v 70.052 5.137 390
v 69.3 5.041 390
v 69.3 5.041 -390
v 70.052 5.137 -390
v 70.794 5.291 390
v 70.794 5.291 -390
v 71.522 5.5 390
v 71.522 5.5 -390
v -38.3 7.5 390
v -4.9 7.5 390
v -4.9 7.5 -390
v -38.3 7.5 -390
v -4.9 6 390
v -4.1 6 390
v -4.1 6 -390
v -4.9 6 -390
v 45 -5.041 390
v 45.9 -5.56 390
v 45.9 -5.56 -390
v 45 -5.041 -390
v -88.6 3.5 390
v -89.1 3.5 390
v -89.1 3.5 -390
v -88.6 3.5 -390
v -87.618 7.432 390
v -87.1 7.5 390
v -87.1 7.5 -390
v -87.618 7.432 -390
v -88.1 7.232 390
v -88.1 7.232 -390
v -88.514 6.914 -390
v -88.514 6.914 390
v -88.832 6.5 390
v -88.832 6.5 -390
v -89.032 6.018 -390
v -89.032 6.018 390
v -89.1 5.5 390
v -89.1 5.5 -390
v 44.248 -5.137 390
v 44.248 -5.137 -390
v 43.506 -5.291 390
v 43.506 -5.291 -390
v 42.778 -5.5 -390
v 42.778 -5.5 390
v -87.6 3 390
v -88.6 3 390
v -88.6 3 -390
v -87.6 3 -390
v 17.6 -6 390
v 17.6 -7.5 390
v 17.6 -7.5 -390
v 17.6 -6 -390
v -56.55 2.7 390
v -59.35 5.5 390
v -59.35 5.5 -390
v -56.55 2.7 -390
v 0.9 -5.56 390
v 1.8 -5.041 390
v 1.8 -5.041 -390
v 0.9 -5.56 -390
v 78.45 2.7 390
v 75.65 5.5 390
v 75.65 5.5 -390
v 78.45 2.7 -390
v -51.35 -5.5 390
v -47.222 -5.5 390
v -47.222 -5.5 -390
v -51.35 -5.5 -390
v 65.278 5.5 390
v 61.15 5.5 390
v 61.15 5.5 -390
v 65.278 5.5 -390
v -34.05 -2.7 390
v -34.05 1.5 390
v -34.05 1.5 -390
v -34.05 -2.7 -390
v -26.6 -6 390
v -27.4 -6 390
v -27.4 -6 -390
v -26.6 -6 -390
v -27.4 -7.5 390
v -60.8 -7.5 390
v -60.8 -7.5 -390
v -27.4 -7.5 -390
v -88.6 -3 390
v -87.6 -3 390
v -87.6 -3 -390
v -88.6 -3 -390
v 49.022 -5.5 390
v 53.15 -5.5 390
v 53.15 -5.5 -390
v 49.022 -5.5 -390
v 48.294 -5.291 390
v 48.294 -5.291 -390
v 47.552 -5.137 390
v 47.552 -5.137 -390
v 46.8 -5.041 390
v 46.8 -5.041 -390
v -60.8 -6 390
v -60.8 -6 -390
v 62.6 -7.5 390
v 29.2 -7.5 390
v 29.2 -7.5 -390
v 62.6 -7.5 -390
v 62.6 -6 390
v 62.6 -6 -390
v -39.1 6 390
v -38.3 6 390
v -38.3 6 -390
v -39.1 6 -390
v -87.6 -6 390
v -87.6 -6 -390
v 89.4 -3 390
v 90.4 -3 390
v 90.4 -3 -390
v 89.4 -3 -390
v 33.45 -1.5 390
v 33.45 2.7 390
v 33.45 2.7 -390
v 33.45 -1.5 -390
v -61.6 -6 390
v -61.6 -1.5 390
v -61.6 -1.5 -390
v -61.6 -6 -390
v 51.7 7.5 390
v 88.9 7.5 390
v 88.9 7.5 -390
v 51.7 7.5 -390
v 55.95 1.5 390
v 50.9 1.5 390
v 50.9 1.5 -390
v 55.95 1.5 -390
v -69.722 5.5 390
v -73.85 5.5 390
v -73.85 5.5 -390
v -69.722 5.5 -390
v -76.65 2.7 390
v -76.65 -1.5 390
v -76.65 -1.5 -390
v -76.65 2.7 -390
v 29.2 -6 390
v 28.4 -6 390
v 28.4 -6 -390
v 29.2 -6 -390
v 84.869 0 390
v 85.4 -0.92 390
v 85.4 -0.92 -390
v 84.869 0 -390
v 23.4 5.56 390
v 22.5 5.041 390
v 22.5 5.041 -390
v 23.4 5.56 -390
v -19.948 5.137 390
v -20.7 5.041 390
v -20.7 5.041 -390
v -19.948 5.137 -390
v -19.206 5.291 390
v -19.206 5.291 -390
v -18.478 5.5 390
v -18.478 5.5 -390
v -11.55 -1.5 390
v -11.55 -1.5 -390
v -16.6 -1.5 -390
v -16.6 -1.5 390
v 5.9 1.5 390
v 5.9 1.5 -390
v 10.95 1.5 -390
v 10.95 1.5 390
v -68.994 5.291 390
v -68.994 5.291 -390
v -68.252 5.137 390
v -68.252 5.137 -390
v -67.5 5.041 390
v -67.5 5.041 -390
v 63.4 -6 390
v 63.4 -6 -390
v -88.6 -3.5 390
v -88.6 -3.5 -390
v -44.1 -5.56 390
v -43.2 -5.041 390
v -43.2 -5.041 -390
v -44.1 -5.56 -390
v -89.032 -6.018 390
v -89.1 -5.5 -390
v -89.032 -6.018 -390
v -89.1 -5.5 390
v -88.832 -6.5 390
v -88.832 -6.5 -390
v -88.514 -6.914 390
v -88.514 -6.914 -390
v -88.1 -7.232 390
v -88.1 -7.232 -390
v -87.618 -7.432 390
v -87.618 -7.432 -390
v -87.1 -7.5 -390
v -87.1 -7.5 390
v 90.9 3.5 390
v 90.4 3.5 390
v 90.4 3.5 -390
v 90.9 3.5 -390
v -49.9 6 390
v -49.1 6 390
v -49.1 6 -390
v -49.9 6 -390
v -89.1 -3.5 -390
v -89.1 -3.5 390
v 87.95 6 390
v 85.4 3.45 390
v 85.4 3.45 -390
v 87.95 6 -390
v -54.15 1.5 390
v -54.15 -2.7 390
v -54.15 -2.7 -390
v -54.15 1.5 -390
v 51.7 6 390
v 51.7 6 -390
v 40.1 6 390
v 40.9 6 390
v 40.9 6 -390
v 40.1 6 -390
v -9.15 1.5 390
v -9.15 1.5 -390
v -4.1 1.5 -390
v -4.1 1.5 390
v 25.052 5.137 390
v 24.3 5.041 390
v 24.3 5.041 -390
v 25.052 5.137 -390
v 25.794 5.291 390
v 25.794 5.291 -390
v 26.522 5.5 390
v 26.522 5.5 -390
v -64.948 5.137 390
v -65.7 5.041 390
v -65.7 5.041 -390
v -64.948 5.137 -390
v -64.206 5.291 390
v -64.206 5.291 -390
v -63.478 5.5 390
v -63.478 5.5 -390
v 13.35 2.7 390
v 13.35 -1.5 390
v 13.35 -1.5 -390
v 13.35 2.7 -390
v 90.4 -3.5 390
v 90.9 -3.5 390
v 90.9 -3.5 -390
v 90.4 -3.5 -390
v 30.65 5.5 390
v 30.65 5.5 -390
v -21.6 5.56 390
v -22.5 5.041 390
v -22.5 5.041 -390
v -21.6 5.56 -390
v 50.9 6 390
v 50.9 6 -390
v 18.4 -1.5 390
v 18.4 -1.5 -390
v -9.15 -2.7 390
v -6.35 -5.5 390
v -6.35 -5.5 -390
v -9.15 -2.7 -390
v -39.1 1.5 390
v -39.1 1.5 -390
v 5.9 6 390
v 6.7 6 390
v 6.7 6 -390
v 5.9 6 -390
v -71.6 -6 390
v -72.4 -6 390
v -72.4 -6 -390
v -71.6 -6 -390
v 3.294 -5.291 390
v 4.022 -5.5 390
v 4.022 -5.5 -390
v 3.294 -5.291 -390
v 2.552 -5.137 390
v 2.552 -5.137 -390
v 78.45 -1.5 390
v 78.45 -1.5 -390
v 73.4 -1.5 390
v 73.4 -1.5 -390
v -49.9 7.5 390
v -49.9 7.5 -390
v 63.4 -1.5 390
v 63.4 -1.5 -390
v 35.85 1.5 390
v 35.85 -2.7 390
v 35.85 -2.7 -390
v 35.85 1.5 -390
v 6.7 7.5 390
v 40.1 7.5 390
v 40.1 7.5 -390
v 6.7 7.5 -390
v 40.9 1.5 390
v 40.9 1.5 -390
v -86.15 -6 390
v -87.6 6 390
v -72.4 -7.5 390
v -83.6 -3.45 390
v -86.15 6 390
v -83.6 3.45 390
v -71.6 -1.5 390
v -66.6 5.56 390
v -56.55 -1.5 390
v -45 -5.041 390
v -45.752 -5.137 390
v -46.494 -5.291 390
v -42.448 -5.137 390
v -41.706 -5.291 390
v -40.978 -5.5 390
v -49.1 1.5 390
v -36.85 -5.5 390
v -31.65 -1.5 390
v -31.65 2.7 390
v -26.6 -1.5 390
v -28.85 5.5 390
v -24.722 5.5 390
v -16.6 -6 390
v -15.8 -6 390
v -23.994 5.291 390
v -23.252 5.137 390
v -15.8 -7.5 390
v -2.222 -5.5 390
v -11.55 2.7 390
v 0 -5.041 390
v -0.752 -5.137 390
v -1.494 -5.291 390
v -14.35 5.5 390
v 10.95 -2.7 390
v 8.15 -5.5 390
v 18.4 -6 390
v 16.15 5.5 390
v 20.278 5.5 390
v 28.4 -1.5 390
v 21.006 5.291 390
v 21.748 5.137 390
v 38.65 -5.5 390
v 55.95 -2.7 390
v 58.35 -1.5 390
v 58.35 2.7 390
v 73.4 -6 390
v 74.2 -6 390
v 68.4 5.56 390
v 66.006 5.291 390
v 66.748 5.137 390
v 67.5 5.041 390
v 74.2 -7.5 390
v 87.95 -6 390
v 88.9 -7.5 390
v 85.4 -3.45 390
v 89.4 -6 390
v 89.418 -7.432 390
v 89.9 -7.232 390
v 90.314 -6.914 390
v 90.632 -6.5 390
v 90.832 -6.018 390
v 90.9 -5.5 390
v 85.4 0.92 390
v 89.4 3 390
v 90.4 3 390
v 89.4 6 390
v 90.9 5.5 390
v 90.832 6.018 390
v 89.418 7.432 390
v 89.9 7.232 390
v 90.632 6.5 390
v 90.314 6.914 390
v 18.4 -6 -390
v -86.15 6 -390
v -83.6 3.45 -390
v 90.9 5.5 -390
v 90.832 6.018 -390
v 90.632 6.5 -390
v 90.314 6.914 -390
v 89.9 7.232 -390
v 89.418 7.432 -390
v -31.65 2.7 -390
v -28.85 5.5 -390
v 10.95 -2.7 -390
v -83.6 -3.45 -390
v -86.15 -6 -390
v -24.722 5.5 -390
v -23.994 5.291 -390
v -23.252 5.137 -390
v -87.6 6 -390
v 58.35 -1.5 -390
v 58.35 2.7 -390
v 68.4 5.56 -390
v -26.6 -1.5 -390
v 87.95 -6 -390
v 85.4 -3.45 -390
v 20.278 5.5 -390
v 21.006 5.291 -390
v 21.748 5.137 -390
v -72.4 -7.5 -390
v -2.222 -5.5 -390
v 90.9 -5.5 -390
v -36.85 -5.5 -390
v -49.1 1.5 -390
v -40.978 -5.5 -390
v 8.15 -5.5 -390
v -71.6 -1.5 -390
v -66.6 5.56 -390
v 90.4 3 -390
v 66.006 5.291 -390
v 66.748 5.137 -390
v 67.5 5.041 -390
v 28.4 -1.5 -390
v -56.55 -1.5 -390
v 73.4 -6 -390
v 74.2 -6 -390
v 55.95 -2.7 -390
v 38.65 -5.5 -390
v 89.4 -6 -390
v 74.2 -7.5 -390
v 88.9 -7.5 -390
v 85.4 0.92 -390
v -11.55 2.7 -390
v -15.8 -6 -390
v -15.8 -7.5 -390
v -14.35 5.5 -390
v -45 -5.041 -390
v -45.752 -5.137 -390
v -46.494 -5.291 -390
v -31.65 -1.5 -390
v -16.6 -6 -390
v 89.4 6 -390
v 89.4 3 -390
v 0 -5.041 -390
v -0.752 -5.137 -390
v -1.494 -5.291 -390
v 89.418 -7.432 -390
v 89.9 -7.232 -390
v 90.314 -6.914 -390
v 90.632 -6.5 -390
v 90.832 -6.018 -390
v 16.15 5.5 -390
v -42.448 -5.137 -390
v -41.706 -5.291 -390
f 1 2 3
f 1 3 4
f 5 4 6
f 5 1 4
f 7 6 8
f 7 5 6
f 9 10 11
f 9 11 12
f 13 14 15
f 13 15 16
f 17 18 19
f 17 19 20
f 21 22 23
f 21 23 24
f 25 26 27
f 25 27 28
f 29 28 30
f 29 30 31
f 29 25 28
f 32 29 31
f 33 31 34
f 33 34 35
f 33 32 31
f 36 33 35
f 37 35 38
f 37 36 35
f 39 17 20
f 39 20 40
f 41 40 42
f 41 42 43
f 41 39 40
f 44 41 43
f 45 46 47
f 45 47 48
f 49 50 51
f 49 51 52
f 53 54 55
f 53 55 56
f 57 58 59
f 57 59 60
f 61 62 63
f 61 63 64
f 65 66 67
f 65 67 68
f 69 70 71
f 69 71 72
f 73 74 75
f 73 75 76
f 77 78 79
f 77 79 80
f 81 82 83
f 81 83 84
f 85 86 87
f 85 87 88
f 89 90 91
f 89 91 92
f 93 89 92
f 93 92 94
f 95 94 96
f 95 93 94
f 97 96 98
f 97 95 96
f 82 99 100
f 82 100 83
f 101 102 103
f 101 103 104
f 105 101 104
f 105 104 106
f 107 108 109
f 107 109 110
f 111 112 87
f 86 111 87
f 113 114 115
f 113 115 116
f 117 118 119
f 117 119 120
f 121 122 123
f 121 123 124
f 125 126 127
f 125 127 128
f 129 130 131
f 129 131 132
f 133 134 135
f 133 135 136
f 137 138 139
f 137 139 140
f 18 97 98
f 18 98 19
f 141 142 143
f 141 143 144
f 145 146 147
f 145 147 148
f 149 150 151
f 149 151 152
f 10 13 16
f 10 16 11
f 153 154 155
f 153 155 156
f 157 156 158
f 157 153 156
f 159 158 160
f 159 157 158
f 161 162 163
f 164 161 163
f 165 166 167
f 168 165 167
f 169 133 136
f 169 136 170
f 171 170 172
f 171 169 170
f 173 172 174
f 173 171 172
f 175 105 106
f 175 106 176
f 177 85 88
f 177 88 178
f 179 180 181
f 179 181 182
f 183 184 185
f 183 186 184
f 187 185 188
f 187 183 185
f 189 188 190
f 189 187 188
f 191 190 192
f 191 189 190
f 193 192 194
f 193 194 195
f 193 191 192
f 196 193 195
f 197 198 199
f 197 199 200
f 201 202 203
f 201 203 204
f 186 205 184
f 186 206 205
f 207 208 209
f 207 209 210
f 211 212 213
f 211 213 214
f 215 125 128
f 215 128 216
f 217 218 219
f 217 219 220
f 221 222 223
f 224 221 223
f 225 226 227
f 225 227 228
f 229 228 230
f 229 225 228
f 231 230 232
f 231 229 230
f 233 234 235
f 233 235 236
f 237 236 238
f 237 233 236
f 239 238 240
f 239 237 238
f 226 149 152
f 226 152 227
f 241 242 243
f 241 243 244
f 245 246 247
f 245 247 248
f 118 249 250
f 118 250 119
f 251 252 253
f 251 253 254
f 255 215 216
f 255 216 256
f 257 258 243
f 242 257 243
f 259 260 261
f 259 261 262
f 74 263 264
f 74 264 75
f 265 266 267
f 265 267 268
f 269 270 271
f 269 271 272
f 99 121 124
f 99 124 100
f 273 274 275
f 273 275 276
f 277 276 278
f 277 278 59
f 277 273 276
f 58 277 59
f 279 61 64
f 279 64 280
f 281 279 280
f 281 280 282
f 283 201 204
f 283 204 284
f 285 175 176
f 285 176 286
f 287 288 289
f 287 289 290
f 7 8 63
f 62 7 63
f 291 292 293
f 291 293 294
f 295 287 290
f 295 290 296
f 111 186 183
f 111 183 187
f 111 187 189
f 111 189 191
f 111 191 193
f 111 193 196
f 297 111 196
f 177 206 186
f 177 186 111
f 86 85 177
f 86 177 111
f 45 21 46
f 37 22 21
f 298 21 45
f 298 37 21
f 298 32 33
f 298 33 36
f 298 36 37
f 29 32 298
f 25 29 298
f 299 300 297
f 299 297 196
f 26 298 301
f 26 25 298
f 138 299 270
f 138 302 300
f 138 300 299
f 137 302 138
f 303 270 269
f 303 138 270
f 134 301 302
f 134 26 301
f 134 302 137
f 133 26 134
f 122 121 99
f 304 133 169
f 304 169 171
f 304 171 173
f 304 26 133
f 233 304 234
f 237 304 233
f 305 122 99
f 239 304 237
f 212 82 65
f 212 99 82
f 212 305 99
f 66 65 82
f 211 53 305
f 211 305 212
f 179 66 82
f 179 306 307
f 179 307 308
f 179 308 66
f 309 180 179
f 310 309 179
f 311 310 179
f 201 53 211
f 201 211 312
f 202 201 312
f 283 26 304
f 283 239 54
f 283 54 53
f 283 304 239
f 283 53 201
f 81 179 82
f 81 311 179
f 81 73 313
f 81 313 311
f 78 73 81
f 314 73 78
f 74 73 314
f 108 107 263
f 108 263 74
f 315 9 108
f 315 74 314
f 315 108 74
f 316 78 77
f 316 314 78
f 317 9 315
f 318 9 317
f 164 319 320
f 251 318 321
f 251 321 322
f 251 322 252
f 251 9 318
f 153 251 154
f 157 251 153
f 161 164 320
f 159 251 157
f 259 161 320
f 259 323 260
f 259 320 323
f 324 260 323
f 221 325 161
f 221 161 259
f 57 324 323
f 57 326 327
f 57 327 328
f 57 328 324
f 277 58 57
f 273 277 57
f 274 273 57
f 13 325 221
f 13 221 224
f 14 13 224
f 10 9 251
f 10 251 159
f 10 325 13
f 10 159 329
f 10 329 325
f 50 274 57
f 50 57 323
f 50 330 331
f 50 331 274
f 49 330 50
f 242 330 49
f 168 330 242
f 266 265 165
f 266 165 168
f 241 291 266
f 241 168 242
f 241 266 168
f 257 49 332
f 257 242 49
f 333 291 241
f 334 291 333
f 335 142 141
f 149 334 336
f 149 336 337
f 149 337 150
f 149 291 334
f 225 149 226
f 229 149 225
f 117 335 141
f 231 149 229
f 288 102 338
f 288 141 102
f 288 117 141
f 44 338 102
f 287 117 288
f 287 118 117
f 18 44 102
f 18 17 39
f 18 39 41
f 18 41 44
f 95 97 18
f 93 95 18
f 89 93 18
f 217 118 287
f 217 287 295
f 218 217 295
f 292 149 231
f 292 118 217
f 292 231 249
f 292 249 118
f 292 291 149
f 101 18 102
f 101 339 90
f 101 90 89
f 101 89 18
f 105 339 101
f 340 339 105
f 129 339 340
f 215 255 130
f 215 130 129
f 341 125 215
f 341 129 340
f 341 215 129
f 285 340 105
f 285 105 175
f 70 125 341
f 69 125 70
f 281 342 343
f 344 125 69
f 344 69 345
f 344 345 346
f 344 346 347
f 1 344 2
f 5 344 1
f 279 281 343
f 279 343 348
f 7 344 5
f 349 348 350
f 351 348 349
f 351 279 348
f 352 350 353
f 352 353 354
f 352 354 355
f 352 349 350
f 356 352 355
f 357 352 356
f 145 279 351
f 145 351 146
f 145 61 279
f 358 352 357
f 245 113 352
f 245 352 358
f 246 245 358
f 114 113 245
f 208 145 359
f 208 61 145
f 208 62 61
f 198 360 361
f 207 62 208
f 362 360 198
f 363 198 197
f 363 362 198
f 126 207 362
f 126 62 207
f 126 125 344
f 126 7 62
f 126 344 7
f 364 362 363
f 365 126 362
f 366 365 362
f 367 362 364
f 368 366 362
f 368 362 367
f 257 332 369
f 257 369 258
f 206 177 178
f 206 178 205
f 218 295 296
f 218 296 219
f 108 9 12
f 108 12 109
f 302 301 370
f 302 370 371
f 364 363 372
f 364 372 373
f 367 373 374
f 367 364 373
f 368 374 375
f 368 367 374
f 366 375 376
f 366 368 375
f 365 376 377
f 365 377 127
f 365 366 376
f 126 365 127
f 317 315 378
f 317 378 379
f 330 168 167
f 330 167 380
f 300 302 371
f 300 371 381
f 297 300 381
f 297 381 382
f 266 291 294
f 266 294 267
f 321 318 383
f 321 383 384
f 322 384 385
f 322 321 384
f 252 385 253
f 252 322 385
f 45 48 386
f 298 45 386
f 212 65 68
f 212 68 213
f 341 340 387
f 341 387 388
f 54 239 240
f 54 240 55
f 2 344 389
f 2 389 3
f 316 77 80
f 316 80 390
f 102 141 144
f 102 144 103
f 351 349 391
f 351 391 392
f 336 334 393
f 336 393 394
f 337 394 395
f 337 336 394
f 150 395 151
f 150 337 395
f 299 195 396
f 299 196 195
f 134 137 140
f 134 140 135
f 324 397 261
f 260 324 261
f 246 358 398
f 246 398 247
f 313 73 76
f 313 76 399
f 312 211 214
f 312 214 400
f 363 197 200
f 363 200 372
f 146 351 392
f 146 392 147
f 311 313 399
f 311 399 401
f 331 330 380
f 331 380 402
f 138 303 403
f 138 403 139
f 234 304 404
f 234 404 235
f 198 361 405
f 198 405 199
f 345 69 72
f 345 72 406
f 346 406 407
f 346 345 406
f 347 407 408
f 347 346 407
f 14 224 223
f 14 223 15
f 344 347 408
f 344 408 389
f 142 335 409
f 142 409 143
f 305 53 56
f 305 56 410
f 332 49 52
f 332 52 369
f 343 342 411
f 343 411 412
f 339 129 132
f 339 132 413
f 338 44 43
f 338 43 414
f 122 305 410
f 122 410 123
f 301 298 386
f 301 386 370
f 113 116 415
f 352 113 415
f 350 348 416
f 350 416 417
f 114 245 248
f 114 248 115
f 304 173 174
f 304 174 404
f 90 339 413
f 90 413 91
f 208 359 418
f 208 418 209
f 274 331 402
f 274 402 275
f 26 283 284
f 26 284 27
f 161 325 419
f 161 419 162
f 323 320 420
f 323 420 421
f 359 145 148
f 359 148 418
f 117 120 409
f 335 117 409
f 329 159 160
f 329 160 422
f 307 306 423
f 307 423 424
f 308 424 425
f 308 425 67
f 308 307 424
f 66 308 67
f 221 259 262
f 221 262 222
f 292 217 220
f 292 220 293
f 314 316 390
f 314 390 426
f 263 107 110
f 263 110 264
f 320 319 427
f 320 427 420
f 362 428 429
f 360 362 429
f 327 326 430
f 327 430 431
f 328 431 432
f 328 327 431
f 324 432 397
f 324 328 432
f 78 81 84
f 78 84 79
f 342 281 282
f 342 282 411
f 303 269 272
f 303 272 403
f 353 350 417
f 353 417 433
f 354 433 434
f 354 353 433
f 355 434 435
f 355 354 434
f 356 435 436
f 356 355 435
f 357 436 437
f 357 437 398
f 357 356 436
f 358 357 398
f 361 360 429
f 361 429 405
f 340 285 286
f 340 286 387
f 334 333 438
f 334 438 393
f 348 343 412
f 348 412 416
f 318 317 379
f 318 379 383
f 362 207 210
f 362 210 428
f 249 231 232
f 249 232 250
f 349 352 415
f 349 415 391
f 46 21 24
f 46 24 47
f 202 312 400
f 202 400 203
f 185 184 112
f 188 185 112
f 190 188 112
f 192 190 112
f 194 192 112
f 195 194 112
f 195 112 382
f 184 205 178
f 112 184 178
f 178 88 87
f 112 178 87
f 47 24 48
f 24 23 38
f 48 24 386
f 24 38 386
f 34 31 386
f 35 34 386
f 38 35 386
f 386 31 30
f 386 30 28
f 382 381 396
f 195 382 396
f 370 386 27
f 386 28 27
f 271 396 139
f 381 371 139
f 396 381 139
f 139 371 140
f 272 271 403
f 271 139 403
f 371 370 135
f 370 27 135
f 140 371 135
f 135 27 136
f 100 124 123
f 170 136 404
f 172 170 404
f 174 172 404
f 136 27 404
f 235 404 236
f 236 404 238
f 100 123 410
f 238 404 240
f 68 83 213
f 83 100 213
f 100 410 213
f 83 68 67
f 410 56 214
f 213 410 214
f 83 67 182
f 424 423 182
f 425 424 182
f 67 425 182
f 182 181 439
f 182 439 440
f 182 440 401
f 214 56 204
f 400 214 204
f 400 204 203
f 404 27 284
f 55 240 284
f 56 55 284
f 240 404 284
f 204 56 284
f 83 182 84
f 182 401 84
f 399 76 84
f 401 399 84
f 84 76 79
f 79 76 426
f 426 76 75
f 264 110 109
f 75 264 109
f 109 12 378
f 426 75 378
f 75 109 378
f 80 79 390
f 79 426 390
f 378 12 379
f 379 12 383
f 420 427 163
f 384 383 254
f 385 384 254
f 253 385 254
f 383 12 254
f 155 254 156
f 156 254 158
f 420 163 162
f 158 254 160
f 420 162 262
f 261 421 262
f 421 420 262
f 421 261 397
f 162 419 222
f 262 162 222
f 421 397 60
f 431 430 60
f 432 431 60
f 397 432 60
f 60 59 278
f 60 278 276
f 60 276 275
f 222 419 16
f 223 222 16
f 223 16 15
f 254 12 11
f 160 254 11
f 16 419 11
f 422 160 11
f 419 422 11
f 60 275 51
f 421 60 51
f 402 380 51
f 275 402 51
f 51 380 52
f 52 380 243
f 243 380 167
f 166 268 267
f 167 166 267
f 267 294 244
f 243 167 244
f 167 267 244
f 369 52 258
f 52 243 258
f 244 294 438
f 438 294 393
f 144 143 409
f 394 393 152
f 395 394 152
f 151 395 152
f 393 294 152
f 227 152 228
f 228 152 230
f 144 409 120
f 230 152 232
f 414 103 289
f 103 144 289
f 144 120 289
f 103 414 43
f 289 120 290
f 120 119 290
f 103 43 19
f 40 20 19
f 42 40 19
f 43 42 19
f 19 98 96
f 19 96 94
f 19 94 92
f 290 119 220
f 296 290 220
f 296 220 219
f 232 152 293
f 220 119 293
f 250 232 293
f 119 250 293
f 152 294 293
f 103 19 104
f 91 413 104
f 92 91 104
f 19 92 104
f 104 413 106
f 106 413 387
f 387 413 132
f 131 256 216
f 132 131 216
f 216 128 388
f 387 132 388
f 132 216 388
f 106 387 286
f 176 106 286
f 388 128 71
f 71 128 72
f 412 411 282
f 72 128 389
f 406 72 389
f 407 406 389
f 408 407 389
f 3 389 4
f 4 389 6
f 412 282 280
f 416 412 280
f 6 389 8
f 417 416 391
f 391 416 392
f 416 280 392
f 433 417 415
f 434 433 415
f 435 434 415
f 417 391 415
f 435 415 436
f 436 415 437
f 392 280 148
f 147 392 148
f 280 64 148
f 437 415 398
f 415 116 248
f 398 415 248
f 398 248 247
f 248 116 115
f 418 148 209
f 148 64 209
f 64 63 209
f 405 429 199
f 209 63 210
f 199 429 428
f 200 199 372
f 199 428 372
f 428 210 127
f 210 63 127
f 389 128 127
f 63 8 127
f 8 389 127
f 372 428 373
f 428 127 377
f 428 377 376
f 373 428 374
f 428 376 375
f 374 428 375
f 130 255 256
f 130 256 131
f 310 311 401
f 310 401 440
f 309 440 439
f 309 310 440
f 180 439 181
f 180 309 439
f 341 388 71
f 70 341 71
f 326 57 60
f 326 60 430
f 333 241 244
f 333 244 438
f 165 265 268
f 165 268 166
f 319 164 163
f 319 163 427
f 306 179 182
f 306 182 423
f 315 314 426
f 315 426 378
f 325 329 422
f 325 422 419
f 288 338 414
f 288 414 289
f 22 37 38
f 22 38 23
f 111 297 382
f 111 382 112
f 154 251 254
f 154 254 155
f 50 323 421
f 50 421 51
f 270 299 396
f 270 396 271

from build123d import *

# Parameters (mm, degrees)
EXTRUDE_531_DEPTH = 390


with BuildPart() as part:
    # Model → Extrude 531 (new, symmetric)
    with BuildSketch(Plane.XY):
        with BuildLine():
            Line((-87.100000001, -7.500000002), (-72.400000001, -7.500000002))
            Line((-72.400000001, -7.500000002), (-72.400000001, -6.000000002))
            Line((-72.400000001, -6.000000002), (-71.600000001, -6.000000002))
            Line((-71.600000001, -6.000000002), (-71.600000001, -1.500000002))
            Line((-71.600000001, -1.500000002), (-76.650000001, -1.500000002))
            Line((-76.650000001, -1.500000002), (-76.650000001, 2.699999998))
            Line((-76.650000001, 2.699999998), (-73.850000001, 5.499999998))
            Line((-73.850000001, 5.499999998), (-69.722499001, 5.499999998))
            ThreePointArc((-69.722499001, 5.499999998), (-68.624324752, 5.207037765), (-67.500000003, 5.040582344))
            Line((-67.500000003, 5.040582344), (-66.6, 5.560197588))
            Line((-66.6, 5.560197588), (-65.700000001, 5.040582347))
            ThreePointArc((-65.700000001, 5.040582347), (-64.575675254, 5.207037766), (-63.477501008, 5.499999998))
            Line((-63.477501008, 5.499999998), (-59.350000001, 5.499999998))
            Line((-59.350000001, 5.499999998), (-56.550000001, 2.699999998))
            Line((-56.550000001, 2.699999998), (-56.550000001, -1.500000002))
            Line((-56.550000001, -1.500000002), (-61.600000001, -1.500000002))
            Line((-61.600000001, -1.500000002), (-61.600000001, -6.000000002))
            Line((-61.600000001, -6.000000002), (-60.800000001, -6.000000002))
            Line((-60.800000001, -6.000000002), (-60.800000001, -7.500000002))
            Line((-60.800000001, -7.500000002), (-27.400000001, -7.500000002))
            Line((-27.400000001, -7.500000002), (-27.400000001, -6.000000002))
            Line((-27.400000001, -6.000000002), (-26.600000001, -6.000000002))
            Line((-26.600000001, -6.000000002), (-26.600000001, -1.500000002))
            Line((-26.600000001, -1.500000002), (-31.650000001, -1.500000002))
            Line((-31.650000001, -1.500000002), (-31.650000001, 2.699999998))
            Line((-31.650000001, 2.699999998), (-28.850000001, 5.499999998))
            Line((-28.850000001, 5.499999998), (-24.722499001, 5.499999998))
            ThreePointArc((-24.722499001, 5.499999998), (-23.624324752, 5.207037765), (-22.500000003, 5.040582344))
            Line((-22.500000003, 5.040582344), (-21.6, 5.560197588))
            Line((-21.6, 5.560197588), (-20.700000001, 5.040582347))
            ThreePointArc((-20.700000001, 5.040582347), (-19.575675254, 5.207037766), (-18.477501008, 5.499999998))
            Line((-18.477501008, 5.499999998), (-14.350000001, 5.499999998))
            Line((-14.350000001, 5.499999998), (-11.550000001, 2.699999998))
            Line((-11.550000001, 2.699999998), (-11.550000001, -1.500000002))
            Line((-11.550000001, -1.500000002), (-16.600000001, -1.500000002))
            Line((-16.600000001, -1.500000002), (-16.600000001, -6.000000002))
            Line((-16.600000001, -6.000000002), (-15.800000001, -6.000000002))
            Line((-15.800000001, -6.000000002), (-15.800000001, -7.500000002))
            Line((-15.800000001, -7.500000002), (17.599999999, -7.500000002))
            Line((17.599999999, -7.500000002), (17.599999999, -6.000000002))
            Line((17.599999999, -6.000000002), (18.399999999, -6.000000002))
            Line((18.399999999, -6.000000002), (18.399999999, -1.500000002))
            Line((18.399999999, -1.500000002), (13.349999999, -1.500000002))
            Line((13.349999999, -1.500000002), (13.349999999, 2.699999998))
            Line((13.349999999, 2.699999998), (16.149999999, 5.499999998))
            Line((16.149999999, 5.499999998), (20.277500999, 5.499999998))
            ThreePointArc((20.277500999, 5.499999998), (21.375675248, 5.207037765), (22.499999997, 5.040582344))
            Line((22.499999997, 5.040582344), (23.4, 5.560197588))
            Line((23.4, 5.560197588), (24.299999999, 5.040582347))
            ThreePointArc((24.299999999, 5.040582347), (25.424324746, 5.207037766), (26.522498992, 5.499999998))
            Line((26.522498992, 5.499999998), (30.649999999, 5.499999998))
            Line((30.649999999, 5.499999998), (33.449999999, 2.699999998))
            Line((33.449999999, 2.699999998), (33.449999999, -1.500000002))
            Line((33.449999999, -1.500000002), (28.399999999, -1.500000002))
            Line((28.399999999, -1.500000002), (28.399999999, -6.000000002))
            Line((28.399999999, -6.000000002), (29.199999999, -6.000000002))
            Line((29.199999999, -6.000000002), (29.199999999, -7.500000002))
            Line((29.199999999, -7.500000002), (62.599999999, -7.500000002))
            Line((62.599999999, -7.500000002), (62.599999999, -6.000000002))
            Line((62.599999999, -6.000000002), (63.399999999, -6.000000002))
            Line((63.399999999, -6.000000002), (63.399999999, -1.500000002))
            Line((63.399999999, -1.500000002), (58.349999999, -1.500000002))
            Line((58.349999999, -1.500000002), (58.349999999, 2.699999998))
            Line((58.349999999, 2.699999998), (61.149999999, 5.499999998))
            Line((61.149999999, 5.499999998), (65.277500999, 5.499999998))
            ThreePointArc((65.277500999, 5.499999998), (66.375675248, 5.207037765), (67.499999997, 5.040582344))
            Line((67.499999997, 5.040582344), (68.4, 5.560197588))
            Line((68.4, 5.560197588), (69.299999999, 5.040582347))
            ThreePointArc((69.299999999, 5.040582347), (70.424324746, 5.207037766), (71.522498992, 5.499999998))
            Line((71.522498992, 5.499999998), (75.649999999, 5.499999998))
            Line((75.649999999, 5.499999998), (78.449999999, 2.699999998))
            Line((78.449999999, 2.699999998), (78.449999999, -1.500000002))
            Line((78.449999999, -1.500000002), (73.399999999, -1.500000002))
            Line((73.399999999, -1.500000002), (73.399999999, -6.000000002))
            Line((73.399999999, -6.000000002), (74.199999999, -6.000000002))
            Line((74.199999999, -6.000000002), (74.199999999, -7.500000002))
            Line((74.199999999, -7.500000002), (88.899999999, -7.500000002))
            ThreePointArc((88.899999999, -7.500000002), (90.314213561, -6.914213564), (90.899999999, -5.500000002))
            Line((90.899999999, -5.500000002), (90.899999999, -3.500000002))
            Line((90.899999999, -3.500000002), (90.399999999, -3.500000002))
            Line((90.399999999, -3.500000002), (90.399999999, -3.000000002))
            Line((90.399999999, -3.000000002), (89.399999999, -3.000000002))
            Line((89.399999999, -3.000000002), (89.399999999, -6.000000002))
            Line((89.399999999, -6.000000002), (87.949999999, -6.000000002))
            Line((87.949999999, -6.000000002), (85.399999999, -3.450000002))
            Line((85.399999999, -3.450000002), (85.399999999, -0.919615242))
            Line((85.399999999, -0.919615242), (84.869059892, 0))
            Line((84.869059892, 0), (85.399999999, 0.919615242))
            Line((85.399999999, 0.919615242), (85.399999999, 3.450000002))
            Line((85.399999999, 3.450000002), (87.949999999, 6.000000002))
            Line((87.949999999, 6.000000002), (89.399999999, 6.000000002))
            Line((89.399999999, 6.000000002), (89.399999999, 3.000000002))
            Line((89.399999999, 3.000000002), (90.399999999, 3.000000002))
            Line((90.399999999, 3.000000002), (90.399999999, 3.500000002))
            Line((90.399999999, 3.500000002), (90.899999999, 3.500000002))
            Line((90.899999999, 3.500000002), (90.899999999, 5.500000002))
            ThreePointArc((90.899999999, 5.500000002), (90.314213561, 6.914213564), (88.899999999, 7.500000002))
            Line((88.899999999, 7.500000002), (51.7, 7.500000002))
            Line((51.7, 7.500000002), (51.7, 5.999999997))
            Line((51.7, 5.999999997), (50.9, 5.999999997))
            Line((50.9, 5.999999997), (50.9, 1.499999997))
            Line((50.9, 1.499999997), (55.95, 1.499999997))
            Line((55.95, 1.499999997), (55.95, -2.700000003))
            Line((55.95, -2.700000003), (53.15, -5.500000003))
            Line((53.15, -5.500000003), (49.022499, -5.500000003))
            ThreePointArc((49.022499, -5.500000003), (47.924324751, -5.20703777), (46.800000002, -5.040582349))
            Line((46.800000002, -5.040582349), (45.899999999, -5.560197593))
            Line((45.899999999, -5.560197593), (45, -5.040582352))
            ThreePointArc((45, -5.040582352), (43.875675253, -5.207037771), (42.777501007, -5.500000004))
            Line((42.777501007, -5.500000004), (38.65, -5.500000004))
            Line((38.65, -5.500000004), (35.85, -2.700000004))
            Line((35.85, -2.700000004), (35.85, 1.499999996))
            Line((35.85, 1.499999996), (40.9, 1.499999996))
            Line((40.9, 1.499999996), (40.9, 5.999999996))
            Line((40.9, 5.999999996), (40.1, 5.999999996))
            Line((40.1, 5.999999996), (40.1, 7.499999996))
            Line((40.1, 7.499999996), (6.7, 7.499999996))
            Line((6.7, 7.499999996), (6.7, 5.999999997))
            Line((6.7, 5.999999997), (5.9, 5.999999997))
            Line((5.9, 5.999999997), (5.9, 1.499999997))
            Line((5.9, 1.499999997), (10.95, 1.499999997))
            Line((10.95, 1.499999997), (10.95, -2.700000003))
            Line((10.95, -2.700000003), (8.15, -5.500000003))
            Line((8.15, -5.500000003), (4.022499, -5.500000003))
            ThreePointArc((4.022499, -5.500000003), (2.924324751, -5.20703777), (1.800000002, -5.040582349))
            Line((1.800000002, -5.040582349), (0.899999999, -5.560197593))
            Line((0.899999999, -5.560197593), (0, -5.040582352))
            ThreePointArc((0, -5.040582352), (-1.124324747, -5.207037771), (-2.222498993, -5.500000004))
            Line((-2.222498993, -5.500000004), (-6.35, -5.500000004))
            Line((-6.35, -5.500000004), (-9.15, -2.700000003))
            Line((-9.15, -2.700000003), (-9.15, 1.499999997))
            Line((-9.15, 1.499999997), (-4.1, 1.499999997))
            Line((-4.1, 1.499999997), (-4.1, 5.999999997))
            Line((-4.1, 5.999999997), (-4.9, 5.999999997))
            Line((-4.9, 5.999999997), (-4.9, 7.499999997))
            Line((-4.9, 7.499999997), (-38.3, 7.499999997))
            Line((-38.3, 7.499999997), (-38.3, 5.999999997))
            Line((-38.3, 5.999999997), (-39.1, 5.999999997))
            Line((-39.1, 5.999999997), (-39.1, 1.499999997))
            Line((-39.1, 1.499999997), (-34.05, 1.499999997))
            Line((-34.05, 1.499999997), (-34.05, -2.700000003))
            Line((-34.05, -2.700000003), (-36.85, -5.500000003))
            Line((-36.85, -5.500000003), (-40.977501, -5.500000003))
            ThreePointArc((-40.977501, -5.500000003), (-42.075675249, -5.20703777), (-43.199999998, -5.040582349))
            Line((-43.199999998, -5.040582349), (-44.100000001, -5.560197593))
            Line((-44.100000001, -5.560197593), (-45, -5.040582352))
            ThreePointArc((-45, -5.040582352), (-46.124324747, -5.207037771), (-47.222498993, -5.500000004))
            Line((-47.222498993, -5.500000004), (-51.35, -5.500000004))
            Line((-51.35, -5.500000004), (-54.15, -2.700000004))
            Line((-54.15, -2.700000004), (-54.15, 1.499999996))
            Line((-54.15, 1.499999996), (-49.1, 1.499999996))
            Line((-49.1, 1.499999996), (-49.1, 5.999999996))
            Line((-49.1, 5.999999996), (-49.9, 5.999999996))
            Line((-49.9, 5.999999996), (-49.9, 7.499999998))
            Line((-49.9, 7.499999998), (-87.100000001, 7.499999998))
            ThreePointArc((-87.100000001, 7.499999998), (-88.514213563, 6.91421356), (-89.100000001, 5.499999998))
            Line((-89.100000001, 5.499999998), (-89.100000001, 3.499999998))
            Line((-89.100000001, 3.499999998), (-88.600000001, 3.499999998))
            Line((-88.600000001, 3.499999998), (-88.600000001, 2.999999998))
            Line((-88.600000001, 2.999999998), (-87.600000001, 2.999999998))
            Line((-87.600000001, 2.999999998), (-87.600000001, 5.999999998))
            Line((-87.600000001, 5.999999998), (-86.150000001, 5.999999998))
            Line((-86.150000001, 5.999999998), (-83.600000001, 3.449999998))
            Line((-83.600000001, 3.449999998), (-83.600000001, -3.450000002))
            Line((-83.600000001, -3.450000002), (-86.150000001, -6.000000002))
            Line((-86.150000001, -6.000000002), (-87.600000001, -6.000000002))
            Line((-87.600000001, -6.000000002), (-87.600000001, -3.000000002))
            Line((-87.600000001, -3.000000002), (-88.600000001, -3.000000002))
            Line((-88.600000001, -3.000000002), (-88.600000001, -3.500000002))
            Line((-88.600000001, -3.500000002), (-89.100000001, -3.500000002))
            Line((-89.100000001, -3.500000002), (-89.100000001, -5.500000002))
            ThreePointArc((-89.100000001, -5.500000002), (-88.514213563, -6.914213564), (-87.100000001, -7.500000002))
        make_face()
    extrude(amount=EXTRUDE_531_DEPTH, both=True)


solid = part.part
